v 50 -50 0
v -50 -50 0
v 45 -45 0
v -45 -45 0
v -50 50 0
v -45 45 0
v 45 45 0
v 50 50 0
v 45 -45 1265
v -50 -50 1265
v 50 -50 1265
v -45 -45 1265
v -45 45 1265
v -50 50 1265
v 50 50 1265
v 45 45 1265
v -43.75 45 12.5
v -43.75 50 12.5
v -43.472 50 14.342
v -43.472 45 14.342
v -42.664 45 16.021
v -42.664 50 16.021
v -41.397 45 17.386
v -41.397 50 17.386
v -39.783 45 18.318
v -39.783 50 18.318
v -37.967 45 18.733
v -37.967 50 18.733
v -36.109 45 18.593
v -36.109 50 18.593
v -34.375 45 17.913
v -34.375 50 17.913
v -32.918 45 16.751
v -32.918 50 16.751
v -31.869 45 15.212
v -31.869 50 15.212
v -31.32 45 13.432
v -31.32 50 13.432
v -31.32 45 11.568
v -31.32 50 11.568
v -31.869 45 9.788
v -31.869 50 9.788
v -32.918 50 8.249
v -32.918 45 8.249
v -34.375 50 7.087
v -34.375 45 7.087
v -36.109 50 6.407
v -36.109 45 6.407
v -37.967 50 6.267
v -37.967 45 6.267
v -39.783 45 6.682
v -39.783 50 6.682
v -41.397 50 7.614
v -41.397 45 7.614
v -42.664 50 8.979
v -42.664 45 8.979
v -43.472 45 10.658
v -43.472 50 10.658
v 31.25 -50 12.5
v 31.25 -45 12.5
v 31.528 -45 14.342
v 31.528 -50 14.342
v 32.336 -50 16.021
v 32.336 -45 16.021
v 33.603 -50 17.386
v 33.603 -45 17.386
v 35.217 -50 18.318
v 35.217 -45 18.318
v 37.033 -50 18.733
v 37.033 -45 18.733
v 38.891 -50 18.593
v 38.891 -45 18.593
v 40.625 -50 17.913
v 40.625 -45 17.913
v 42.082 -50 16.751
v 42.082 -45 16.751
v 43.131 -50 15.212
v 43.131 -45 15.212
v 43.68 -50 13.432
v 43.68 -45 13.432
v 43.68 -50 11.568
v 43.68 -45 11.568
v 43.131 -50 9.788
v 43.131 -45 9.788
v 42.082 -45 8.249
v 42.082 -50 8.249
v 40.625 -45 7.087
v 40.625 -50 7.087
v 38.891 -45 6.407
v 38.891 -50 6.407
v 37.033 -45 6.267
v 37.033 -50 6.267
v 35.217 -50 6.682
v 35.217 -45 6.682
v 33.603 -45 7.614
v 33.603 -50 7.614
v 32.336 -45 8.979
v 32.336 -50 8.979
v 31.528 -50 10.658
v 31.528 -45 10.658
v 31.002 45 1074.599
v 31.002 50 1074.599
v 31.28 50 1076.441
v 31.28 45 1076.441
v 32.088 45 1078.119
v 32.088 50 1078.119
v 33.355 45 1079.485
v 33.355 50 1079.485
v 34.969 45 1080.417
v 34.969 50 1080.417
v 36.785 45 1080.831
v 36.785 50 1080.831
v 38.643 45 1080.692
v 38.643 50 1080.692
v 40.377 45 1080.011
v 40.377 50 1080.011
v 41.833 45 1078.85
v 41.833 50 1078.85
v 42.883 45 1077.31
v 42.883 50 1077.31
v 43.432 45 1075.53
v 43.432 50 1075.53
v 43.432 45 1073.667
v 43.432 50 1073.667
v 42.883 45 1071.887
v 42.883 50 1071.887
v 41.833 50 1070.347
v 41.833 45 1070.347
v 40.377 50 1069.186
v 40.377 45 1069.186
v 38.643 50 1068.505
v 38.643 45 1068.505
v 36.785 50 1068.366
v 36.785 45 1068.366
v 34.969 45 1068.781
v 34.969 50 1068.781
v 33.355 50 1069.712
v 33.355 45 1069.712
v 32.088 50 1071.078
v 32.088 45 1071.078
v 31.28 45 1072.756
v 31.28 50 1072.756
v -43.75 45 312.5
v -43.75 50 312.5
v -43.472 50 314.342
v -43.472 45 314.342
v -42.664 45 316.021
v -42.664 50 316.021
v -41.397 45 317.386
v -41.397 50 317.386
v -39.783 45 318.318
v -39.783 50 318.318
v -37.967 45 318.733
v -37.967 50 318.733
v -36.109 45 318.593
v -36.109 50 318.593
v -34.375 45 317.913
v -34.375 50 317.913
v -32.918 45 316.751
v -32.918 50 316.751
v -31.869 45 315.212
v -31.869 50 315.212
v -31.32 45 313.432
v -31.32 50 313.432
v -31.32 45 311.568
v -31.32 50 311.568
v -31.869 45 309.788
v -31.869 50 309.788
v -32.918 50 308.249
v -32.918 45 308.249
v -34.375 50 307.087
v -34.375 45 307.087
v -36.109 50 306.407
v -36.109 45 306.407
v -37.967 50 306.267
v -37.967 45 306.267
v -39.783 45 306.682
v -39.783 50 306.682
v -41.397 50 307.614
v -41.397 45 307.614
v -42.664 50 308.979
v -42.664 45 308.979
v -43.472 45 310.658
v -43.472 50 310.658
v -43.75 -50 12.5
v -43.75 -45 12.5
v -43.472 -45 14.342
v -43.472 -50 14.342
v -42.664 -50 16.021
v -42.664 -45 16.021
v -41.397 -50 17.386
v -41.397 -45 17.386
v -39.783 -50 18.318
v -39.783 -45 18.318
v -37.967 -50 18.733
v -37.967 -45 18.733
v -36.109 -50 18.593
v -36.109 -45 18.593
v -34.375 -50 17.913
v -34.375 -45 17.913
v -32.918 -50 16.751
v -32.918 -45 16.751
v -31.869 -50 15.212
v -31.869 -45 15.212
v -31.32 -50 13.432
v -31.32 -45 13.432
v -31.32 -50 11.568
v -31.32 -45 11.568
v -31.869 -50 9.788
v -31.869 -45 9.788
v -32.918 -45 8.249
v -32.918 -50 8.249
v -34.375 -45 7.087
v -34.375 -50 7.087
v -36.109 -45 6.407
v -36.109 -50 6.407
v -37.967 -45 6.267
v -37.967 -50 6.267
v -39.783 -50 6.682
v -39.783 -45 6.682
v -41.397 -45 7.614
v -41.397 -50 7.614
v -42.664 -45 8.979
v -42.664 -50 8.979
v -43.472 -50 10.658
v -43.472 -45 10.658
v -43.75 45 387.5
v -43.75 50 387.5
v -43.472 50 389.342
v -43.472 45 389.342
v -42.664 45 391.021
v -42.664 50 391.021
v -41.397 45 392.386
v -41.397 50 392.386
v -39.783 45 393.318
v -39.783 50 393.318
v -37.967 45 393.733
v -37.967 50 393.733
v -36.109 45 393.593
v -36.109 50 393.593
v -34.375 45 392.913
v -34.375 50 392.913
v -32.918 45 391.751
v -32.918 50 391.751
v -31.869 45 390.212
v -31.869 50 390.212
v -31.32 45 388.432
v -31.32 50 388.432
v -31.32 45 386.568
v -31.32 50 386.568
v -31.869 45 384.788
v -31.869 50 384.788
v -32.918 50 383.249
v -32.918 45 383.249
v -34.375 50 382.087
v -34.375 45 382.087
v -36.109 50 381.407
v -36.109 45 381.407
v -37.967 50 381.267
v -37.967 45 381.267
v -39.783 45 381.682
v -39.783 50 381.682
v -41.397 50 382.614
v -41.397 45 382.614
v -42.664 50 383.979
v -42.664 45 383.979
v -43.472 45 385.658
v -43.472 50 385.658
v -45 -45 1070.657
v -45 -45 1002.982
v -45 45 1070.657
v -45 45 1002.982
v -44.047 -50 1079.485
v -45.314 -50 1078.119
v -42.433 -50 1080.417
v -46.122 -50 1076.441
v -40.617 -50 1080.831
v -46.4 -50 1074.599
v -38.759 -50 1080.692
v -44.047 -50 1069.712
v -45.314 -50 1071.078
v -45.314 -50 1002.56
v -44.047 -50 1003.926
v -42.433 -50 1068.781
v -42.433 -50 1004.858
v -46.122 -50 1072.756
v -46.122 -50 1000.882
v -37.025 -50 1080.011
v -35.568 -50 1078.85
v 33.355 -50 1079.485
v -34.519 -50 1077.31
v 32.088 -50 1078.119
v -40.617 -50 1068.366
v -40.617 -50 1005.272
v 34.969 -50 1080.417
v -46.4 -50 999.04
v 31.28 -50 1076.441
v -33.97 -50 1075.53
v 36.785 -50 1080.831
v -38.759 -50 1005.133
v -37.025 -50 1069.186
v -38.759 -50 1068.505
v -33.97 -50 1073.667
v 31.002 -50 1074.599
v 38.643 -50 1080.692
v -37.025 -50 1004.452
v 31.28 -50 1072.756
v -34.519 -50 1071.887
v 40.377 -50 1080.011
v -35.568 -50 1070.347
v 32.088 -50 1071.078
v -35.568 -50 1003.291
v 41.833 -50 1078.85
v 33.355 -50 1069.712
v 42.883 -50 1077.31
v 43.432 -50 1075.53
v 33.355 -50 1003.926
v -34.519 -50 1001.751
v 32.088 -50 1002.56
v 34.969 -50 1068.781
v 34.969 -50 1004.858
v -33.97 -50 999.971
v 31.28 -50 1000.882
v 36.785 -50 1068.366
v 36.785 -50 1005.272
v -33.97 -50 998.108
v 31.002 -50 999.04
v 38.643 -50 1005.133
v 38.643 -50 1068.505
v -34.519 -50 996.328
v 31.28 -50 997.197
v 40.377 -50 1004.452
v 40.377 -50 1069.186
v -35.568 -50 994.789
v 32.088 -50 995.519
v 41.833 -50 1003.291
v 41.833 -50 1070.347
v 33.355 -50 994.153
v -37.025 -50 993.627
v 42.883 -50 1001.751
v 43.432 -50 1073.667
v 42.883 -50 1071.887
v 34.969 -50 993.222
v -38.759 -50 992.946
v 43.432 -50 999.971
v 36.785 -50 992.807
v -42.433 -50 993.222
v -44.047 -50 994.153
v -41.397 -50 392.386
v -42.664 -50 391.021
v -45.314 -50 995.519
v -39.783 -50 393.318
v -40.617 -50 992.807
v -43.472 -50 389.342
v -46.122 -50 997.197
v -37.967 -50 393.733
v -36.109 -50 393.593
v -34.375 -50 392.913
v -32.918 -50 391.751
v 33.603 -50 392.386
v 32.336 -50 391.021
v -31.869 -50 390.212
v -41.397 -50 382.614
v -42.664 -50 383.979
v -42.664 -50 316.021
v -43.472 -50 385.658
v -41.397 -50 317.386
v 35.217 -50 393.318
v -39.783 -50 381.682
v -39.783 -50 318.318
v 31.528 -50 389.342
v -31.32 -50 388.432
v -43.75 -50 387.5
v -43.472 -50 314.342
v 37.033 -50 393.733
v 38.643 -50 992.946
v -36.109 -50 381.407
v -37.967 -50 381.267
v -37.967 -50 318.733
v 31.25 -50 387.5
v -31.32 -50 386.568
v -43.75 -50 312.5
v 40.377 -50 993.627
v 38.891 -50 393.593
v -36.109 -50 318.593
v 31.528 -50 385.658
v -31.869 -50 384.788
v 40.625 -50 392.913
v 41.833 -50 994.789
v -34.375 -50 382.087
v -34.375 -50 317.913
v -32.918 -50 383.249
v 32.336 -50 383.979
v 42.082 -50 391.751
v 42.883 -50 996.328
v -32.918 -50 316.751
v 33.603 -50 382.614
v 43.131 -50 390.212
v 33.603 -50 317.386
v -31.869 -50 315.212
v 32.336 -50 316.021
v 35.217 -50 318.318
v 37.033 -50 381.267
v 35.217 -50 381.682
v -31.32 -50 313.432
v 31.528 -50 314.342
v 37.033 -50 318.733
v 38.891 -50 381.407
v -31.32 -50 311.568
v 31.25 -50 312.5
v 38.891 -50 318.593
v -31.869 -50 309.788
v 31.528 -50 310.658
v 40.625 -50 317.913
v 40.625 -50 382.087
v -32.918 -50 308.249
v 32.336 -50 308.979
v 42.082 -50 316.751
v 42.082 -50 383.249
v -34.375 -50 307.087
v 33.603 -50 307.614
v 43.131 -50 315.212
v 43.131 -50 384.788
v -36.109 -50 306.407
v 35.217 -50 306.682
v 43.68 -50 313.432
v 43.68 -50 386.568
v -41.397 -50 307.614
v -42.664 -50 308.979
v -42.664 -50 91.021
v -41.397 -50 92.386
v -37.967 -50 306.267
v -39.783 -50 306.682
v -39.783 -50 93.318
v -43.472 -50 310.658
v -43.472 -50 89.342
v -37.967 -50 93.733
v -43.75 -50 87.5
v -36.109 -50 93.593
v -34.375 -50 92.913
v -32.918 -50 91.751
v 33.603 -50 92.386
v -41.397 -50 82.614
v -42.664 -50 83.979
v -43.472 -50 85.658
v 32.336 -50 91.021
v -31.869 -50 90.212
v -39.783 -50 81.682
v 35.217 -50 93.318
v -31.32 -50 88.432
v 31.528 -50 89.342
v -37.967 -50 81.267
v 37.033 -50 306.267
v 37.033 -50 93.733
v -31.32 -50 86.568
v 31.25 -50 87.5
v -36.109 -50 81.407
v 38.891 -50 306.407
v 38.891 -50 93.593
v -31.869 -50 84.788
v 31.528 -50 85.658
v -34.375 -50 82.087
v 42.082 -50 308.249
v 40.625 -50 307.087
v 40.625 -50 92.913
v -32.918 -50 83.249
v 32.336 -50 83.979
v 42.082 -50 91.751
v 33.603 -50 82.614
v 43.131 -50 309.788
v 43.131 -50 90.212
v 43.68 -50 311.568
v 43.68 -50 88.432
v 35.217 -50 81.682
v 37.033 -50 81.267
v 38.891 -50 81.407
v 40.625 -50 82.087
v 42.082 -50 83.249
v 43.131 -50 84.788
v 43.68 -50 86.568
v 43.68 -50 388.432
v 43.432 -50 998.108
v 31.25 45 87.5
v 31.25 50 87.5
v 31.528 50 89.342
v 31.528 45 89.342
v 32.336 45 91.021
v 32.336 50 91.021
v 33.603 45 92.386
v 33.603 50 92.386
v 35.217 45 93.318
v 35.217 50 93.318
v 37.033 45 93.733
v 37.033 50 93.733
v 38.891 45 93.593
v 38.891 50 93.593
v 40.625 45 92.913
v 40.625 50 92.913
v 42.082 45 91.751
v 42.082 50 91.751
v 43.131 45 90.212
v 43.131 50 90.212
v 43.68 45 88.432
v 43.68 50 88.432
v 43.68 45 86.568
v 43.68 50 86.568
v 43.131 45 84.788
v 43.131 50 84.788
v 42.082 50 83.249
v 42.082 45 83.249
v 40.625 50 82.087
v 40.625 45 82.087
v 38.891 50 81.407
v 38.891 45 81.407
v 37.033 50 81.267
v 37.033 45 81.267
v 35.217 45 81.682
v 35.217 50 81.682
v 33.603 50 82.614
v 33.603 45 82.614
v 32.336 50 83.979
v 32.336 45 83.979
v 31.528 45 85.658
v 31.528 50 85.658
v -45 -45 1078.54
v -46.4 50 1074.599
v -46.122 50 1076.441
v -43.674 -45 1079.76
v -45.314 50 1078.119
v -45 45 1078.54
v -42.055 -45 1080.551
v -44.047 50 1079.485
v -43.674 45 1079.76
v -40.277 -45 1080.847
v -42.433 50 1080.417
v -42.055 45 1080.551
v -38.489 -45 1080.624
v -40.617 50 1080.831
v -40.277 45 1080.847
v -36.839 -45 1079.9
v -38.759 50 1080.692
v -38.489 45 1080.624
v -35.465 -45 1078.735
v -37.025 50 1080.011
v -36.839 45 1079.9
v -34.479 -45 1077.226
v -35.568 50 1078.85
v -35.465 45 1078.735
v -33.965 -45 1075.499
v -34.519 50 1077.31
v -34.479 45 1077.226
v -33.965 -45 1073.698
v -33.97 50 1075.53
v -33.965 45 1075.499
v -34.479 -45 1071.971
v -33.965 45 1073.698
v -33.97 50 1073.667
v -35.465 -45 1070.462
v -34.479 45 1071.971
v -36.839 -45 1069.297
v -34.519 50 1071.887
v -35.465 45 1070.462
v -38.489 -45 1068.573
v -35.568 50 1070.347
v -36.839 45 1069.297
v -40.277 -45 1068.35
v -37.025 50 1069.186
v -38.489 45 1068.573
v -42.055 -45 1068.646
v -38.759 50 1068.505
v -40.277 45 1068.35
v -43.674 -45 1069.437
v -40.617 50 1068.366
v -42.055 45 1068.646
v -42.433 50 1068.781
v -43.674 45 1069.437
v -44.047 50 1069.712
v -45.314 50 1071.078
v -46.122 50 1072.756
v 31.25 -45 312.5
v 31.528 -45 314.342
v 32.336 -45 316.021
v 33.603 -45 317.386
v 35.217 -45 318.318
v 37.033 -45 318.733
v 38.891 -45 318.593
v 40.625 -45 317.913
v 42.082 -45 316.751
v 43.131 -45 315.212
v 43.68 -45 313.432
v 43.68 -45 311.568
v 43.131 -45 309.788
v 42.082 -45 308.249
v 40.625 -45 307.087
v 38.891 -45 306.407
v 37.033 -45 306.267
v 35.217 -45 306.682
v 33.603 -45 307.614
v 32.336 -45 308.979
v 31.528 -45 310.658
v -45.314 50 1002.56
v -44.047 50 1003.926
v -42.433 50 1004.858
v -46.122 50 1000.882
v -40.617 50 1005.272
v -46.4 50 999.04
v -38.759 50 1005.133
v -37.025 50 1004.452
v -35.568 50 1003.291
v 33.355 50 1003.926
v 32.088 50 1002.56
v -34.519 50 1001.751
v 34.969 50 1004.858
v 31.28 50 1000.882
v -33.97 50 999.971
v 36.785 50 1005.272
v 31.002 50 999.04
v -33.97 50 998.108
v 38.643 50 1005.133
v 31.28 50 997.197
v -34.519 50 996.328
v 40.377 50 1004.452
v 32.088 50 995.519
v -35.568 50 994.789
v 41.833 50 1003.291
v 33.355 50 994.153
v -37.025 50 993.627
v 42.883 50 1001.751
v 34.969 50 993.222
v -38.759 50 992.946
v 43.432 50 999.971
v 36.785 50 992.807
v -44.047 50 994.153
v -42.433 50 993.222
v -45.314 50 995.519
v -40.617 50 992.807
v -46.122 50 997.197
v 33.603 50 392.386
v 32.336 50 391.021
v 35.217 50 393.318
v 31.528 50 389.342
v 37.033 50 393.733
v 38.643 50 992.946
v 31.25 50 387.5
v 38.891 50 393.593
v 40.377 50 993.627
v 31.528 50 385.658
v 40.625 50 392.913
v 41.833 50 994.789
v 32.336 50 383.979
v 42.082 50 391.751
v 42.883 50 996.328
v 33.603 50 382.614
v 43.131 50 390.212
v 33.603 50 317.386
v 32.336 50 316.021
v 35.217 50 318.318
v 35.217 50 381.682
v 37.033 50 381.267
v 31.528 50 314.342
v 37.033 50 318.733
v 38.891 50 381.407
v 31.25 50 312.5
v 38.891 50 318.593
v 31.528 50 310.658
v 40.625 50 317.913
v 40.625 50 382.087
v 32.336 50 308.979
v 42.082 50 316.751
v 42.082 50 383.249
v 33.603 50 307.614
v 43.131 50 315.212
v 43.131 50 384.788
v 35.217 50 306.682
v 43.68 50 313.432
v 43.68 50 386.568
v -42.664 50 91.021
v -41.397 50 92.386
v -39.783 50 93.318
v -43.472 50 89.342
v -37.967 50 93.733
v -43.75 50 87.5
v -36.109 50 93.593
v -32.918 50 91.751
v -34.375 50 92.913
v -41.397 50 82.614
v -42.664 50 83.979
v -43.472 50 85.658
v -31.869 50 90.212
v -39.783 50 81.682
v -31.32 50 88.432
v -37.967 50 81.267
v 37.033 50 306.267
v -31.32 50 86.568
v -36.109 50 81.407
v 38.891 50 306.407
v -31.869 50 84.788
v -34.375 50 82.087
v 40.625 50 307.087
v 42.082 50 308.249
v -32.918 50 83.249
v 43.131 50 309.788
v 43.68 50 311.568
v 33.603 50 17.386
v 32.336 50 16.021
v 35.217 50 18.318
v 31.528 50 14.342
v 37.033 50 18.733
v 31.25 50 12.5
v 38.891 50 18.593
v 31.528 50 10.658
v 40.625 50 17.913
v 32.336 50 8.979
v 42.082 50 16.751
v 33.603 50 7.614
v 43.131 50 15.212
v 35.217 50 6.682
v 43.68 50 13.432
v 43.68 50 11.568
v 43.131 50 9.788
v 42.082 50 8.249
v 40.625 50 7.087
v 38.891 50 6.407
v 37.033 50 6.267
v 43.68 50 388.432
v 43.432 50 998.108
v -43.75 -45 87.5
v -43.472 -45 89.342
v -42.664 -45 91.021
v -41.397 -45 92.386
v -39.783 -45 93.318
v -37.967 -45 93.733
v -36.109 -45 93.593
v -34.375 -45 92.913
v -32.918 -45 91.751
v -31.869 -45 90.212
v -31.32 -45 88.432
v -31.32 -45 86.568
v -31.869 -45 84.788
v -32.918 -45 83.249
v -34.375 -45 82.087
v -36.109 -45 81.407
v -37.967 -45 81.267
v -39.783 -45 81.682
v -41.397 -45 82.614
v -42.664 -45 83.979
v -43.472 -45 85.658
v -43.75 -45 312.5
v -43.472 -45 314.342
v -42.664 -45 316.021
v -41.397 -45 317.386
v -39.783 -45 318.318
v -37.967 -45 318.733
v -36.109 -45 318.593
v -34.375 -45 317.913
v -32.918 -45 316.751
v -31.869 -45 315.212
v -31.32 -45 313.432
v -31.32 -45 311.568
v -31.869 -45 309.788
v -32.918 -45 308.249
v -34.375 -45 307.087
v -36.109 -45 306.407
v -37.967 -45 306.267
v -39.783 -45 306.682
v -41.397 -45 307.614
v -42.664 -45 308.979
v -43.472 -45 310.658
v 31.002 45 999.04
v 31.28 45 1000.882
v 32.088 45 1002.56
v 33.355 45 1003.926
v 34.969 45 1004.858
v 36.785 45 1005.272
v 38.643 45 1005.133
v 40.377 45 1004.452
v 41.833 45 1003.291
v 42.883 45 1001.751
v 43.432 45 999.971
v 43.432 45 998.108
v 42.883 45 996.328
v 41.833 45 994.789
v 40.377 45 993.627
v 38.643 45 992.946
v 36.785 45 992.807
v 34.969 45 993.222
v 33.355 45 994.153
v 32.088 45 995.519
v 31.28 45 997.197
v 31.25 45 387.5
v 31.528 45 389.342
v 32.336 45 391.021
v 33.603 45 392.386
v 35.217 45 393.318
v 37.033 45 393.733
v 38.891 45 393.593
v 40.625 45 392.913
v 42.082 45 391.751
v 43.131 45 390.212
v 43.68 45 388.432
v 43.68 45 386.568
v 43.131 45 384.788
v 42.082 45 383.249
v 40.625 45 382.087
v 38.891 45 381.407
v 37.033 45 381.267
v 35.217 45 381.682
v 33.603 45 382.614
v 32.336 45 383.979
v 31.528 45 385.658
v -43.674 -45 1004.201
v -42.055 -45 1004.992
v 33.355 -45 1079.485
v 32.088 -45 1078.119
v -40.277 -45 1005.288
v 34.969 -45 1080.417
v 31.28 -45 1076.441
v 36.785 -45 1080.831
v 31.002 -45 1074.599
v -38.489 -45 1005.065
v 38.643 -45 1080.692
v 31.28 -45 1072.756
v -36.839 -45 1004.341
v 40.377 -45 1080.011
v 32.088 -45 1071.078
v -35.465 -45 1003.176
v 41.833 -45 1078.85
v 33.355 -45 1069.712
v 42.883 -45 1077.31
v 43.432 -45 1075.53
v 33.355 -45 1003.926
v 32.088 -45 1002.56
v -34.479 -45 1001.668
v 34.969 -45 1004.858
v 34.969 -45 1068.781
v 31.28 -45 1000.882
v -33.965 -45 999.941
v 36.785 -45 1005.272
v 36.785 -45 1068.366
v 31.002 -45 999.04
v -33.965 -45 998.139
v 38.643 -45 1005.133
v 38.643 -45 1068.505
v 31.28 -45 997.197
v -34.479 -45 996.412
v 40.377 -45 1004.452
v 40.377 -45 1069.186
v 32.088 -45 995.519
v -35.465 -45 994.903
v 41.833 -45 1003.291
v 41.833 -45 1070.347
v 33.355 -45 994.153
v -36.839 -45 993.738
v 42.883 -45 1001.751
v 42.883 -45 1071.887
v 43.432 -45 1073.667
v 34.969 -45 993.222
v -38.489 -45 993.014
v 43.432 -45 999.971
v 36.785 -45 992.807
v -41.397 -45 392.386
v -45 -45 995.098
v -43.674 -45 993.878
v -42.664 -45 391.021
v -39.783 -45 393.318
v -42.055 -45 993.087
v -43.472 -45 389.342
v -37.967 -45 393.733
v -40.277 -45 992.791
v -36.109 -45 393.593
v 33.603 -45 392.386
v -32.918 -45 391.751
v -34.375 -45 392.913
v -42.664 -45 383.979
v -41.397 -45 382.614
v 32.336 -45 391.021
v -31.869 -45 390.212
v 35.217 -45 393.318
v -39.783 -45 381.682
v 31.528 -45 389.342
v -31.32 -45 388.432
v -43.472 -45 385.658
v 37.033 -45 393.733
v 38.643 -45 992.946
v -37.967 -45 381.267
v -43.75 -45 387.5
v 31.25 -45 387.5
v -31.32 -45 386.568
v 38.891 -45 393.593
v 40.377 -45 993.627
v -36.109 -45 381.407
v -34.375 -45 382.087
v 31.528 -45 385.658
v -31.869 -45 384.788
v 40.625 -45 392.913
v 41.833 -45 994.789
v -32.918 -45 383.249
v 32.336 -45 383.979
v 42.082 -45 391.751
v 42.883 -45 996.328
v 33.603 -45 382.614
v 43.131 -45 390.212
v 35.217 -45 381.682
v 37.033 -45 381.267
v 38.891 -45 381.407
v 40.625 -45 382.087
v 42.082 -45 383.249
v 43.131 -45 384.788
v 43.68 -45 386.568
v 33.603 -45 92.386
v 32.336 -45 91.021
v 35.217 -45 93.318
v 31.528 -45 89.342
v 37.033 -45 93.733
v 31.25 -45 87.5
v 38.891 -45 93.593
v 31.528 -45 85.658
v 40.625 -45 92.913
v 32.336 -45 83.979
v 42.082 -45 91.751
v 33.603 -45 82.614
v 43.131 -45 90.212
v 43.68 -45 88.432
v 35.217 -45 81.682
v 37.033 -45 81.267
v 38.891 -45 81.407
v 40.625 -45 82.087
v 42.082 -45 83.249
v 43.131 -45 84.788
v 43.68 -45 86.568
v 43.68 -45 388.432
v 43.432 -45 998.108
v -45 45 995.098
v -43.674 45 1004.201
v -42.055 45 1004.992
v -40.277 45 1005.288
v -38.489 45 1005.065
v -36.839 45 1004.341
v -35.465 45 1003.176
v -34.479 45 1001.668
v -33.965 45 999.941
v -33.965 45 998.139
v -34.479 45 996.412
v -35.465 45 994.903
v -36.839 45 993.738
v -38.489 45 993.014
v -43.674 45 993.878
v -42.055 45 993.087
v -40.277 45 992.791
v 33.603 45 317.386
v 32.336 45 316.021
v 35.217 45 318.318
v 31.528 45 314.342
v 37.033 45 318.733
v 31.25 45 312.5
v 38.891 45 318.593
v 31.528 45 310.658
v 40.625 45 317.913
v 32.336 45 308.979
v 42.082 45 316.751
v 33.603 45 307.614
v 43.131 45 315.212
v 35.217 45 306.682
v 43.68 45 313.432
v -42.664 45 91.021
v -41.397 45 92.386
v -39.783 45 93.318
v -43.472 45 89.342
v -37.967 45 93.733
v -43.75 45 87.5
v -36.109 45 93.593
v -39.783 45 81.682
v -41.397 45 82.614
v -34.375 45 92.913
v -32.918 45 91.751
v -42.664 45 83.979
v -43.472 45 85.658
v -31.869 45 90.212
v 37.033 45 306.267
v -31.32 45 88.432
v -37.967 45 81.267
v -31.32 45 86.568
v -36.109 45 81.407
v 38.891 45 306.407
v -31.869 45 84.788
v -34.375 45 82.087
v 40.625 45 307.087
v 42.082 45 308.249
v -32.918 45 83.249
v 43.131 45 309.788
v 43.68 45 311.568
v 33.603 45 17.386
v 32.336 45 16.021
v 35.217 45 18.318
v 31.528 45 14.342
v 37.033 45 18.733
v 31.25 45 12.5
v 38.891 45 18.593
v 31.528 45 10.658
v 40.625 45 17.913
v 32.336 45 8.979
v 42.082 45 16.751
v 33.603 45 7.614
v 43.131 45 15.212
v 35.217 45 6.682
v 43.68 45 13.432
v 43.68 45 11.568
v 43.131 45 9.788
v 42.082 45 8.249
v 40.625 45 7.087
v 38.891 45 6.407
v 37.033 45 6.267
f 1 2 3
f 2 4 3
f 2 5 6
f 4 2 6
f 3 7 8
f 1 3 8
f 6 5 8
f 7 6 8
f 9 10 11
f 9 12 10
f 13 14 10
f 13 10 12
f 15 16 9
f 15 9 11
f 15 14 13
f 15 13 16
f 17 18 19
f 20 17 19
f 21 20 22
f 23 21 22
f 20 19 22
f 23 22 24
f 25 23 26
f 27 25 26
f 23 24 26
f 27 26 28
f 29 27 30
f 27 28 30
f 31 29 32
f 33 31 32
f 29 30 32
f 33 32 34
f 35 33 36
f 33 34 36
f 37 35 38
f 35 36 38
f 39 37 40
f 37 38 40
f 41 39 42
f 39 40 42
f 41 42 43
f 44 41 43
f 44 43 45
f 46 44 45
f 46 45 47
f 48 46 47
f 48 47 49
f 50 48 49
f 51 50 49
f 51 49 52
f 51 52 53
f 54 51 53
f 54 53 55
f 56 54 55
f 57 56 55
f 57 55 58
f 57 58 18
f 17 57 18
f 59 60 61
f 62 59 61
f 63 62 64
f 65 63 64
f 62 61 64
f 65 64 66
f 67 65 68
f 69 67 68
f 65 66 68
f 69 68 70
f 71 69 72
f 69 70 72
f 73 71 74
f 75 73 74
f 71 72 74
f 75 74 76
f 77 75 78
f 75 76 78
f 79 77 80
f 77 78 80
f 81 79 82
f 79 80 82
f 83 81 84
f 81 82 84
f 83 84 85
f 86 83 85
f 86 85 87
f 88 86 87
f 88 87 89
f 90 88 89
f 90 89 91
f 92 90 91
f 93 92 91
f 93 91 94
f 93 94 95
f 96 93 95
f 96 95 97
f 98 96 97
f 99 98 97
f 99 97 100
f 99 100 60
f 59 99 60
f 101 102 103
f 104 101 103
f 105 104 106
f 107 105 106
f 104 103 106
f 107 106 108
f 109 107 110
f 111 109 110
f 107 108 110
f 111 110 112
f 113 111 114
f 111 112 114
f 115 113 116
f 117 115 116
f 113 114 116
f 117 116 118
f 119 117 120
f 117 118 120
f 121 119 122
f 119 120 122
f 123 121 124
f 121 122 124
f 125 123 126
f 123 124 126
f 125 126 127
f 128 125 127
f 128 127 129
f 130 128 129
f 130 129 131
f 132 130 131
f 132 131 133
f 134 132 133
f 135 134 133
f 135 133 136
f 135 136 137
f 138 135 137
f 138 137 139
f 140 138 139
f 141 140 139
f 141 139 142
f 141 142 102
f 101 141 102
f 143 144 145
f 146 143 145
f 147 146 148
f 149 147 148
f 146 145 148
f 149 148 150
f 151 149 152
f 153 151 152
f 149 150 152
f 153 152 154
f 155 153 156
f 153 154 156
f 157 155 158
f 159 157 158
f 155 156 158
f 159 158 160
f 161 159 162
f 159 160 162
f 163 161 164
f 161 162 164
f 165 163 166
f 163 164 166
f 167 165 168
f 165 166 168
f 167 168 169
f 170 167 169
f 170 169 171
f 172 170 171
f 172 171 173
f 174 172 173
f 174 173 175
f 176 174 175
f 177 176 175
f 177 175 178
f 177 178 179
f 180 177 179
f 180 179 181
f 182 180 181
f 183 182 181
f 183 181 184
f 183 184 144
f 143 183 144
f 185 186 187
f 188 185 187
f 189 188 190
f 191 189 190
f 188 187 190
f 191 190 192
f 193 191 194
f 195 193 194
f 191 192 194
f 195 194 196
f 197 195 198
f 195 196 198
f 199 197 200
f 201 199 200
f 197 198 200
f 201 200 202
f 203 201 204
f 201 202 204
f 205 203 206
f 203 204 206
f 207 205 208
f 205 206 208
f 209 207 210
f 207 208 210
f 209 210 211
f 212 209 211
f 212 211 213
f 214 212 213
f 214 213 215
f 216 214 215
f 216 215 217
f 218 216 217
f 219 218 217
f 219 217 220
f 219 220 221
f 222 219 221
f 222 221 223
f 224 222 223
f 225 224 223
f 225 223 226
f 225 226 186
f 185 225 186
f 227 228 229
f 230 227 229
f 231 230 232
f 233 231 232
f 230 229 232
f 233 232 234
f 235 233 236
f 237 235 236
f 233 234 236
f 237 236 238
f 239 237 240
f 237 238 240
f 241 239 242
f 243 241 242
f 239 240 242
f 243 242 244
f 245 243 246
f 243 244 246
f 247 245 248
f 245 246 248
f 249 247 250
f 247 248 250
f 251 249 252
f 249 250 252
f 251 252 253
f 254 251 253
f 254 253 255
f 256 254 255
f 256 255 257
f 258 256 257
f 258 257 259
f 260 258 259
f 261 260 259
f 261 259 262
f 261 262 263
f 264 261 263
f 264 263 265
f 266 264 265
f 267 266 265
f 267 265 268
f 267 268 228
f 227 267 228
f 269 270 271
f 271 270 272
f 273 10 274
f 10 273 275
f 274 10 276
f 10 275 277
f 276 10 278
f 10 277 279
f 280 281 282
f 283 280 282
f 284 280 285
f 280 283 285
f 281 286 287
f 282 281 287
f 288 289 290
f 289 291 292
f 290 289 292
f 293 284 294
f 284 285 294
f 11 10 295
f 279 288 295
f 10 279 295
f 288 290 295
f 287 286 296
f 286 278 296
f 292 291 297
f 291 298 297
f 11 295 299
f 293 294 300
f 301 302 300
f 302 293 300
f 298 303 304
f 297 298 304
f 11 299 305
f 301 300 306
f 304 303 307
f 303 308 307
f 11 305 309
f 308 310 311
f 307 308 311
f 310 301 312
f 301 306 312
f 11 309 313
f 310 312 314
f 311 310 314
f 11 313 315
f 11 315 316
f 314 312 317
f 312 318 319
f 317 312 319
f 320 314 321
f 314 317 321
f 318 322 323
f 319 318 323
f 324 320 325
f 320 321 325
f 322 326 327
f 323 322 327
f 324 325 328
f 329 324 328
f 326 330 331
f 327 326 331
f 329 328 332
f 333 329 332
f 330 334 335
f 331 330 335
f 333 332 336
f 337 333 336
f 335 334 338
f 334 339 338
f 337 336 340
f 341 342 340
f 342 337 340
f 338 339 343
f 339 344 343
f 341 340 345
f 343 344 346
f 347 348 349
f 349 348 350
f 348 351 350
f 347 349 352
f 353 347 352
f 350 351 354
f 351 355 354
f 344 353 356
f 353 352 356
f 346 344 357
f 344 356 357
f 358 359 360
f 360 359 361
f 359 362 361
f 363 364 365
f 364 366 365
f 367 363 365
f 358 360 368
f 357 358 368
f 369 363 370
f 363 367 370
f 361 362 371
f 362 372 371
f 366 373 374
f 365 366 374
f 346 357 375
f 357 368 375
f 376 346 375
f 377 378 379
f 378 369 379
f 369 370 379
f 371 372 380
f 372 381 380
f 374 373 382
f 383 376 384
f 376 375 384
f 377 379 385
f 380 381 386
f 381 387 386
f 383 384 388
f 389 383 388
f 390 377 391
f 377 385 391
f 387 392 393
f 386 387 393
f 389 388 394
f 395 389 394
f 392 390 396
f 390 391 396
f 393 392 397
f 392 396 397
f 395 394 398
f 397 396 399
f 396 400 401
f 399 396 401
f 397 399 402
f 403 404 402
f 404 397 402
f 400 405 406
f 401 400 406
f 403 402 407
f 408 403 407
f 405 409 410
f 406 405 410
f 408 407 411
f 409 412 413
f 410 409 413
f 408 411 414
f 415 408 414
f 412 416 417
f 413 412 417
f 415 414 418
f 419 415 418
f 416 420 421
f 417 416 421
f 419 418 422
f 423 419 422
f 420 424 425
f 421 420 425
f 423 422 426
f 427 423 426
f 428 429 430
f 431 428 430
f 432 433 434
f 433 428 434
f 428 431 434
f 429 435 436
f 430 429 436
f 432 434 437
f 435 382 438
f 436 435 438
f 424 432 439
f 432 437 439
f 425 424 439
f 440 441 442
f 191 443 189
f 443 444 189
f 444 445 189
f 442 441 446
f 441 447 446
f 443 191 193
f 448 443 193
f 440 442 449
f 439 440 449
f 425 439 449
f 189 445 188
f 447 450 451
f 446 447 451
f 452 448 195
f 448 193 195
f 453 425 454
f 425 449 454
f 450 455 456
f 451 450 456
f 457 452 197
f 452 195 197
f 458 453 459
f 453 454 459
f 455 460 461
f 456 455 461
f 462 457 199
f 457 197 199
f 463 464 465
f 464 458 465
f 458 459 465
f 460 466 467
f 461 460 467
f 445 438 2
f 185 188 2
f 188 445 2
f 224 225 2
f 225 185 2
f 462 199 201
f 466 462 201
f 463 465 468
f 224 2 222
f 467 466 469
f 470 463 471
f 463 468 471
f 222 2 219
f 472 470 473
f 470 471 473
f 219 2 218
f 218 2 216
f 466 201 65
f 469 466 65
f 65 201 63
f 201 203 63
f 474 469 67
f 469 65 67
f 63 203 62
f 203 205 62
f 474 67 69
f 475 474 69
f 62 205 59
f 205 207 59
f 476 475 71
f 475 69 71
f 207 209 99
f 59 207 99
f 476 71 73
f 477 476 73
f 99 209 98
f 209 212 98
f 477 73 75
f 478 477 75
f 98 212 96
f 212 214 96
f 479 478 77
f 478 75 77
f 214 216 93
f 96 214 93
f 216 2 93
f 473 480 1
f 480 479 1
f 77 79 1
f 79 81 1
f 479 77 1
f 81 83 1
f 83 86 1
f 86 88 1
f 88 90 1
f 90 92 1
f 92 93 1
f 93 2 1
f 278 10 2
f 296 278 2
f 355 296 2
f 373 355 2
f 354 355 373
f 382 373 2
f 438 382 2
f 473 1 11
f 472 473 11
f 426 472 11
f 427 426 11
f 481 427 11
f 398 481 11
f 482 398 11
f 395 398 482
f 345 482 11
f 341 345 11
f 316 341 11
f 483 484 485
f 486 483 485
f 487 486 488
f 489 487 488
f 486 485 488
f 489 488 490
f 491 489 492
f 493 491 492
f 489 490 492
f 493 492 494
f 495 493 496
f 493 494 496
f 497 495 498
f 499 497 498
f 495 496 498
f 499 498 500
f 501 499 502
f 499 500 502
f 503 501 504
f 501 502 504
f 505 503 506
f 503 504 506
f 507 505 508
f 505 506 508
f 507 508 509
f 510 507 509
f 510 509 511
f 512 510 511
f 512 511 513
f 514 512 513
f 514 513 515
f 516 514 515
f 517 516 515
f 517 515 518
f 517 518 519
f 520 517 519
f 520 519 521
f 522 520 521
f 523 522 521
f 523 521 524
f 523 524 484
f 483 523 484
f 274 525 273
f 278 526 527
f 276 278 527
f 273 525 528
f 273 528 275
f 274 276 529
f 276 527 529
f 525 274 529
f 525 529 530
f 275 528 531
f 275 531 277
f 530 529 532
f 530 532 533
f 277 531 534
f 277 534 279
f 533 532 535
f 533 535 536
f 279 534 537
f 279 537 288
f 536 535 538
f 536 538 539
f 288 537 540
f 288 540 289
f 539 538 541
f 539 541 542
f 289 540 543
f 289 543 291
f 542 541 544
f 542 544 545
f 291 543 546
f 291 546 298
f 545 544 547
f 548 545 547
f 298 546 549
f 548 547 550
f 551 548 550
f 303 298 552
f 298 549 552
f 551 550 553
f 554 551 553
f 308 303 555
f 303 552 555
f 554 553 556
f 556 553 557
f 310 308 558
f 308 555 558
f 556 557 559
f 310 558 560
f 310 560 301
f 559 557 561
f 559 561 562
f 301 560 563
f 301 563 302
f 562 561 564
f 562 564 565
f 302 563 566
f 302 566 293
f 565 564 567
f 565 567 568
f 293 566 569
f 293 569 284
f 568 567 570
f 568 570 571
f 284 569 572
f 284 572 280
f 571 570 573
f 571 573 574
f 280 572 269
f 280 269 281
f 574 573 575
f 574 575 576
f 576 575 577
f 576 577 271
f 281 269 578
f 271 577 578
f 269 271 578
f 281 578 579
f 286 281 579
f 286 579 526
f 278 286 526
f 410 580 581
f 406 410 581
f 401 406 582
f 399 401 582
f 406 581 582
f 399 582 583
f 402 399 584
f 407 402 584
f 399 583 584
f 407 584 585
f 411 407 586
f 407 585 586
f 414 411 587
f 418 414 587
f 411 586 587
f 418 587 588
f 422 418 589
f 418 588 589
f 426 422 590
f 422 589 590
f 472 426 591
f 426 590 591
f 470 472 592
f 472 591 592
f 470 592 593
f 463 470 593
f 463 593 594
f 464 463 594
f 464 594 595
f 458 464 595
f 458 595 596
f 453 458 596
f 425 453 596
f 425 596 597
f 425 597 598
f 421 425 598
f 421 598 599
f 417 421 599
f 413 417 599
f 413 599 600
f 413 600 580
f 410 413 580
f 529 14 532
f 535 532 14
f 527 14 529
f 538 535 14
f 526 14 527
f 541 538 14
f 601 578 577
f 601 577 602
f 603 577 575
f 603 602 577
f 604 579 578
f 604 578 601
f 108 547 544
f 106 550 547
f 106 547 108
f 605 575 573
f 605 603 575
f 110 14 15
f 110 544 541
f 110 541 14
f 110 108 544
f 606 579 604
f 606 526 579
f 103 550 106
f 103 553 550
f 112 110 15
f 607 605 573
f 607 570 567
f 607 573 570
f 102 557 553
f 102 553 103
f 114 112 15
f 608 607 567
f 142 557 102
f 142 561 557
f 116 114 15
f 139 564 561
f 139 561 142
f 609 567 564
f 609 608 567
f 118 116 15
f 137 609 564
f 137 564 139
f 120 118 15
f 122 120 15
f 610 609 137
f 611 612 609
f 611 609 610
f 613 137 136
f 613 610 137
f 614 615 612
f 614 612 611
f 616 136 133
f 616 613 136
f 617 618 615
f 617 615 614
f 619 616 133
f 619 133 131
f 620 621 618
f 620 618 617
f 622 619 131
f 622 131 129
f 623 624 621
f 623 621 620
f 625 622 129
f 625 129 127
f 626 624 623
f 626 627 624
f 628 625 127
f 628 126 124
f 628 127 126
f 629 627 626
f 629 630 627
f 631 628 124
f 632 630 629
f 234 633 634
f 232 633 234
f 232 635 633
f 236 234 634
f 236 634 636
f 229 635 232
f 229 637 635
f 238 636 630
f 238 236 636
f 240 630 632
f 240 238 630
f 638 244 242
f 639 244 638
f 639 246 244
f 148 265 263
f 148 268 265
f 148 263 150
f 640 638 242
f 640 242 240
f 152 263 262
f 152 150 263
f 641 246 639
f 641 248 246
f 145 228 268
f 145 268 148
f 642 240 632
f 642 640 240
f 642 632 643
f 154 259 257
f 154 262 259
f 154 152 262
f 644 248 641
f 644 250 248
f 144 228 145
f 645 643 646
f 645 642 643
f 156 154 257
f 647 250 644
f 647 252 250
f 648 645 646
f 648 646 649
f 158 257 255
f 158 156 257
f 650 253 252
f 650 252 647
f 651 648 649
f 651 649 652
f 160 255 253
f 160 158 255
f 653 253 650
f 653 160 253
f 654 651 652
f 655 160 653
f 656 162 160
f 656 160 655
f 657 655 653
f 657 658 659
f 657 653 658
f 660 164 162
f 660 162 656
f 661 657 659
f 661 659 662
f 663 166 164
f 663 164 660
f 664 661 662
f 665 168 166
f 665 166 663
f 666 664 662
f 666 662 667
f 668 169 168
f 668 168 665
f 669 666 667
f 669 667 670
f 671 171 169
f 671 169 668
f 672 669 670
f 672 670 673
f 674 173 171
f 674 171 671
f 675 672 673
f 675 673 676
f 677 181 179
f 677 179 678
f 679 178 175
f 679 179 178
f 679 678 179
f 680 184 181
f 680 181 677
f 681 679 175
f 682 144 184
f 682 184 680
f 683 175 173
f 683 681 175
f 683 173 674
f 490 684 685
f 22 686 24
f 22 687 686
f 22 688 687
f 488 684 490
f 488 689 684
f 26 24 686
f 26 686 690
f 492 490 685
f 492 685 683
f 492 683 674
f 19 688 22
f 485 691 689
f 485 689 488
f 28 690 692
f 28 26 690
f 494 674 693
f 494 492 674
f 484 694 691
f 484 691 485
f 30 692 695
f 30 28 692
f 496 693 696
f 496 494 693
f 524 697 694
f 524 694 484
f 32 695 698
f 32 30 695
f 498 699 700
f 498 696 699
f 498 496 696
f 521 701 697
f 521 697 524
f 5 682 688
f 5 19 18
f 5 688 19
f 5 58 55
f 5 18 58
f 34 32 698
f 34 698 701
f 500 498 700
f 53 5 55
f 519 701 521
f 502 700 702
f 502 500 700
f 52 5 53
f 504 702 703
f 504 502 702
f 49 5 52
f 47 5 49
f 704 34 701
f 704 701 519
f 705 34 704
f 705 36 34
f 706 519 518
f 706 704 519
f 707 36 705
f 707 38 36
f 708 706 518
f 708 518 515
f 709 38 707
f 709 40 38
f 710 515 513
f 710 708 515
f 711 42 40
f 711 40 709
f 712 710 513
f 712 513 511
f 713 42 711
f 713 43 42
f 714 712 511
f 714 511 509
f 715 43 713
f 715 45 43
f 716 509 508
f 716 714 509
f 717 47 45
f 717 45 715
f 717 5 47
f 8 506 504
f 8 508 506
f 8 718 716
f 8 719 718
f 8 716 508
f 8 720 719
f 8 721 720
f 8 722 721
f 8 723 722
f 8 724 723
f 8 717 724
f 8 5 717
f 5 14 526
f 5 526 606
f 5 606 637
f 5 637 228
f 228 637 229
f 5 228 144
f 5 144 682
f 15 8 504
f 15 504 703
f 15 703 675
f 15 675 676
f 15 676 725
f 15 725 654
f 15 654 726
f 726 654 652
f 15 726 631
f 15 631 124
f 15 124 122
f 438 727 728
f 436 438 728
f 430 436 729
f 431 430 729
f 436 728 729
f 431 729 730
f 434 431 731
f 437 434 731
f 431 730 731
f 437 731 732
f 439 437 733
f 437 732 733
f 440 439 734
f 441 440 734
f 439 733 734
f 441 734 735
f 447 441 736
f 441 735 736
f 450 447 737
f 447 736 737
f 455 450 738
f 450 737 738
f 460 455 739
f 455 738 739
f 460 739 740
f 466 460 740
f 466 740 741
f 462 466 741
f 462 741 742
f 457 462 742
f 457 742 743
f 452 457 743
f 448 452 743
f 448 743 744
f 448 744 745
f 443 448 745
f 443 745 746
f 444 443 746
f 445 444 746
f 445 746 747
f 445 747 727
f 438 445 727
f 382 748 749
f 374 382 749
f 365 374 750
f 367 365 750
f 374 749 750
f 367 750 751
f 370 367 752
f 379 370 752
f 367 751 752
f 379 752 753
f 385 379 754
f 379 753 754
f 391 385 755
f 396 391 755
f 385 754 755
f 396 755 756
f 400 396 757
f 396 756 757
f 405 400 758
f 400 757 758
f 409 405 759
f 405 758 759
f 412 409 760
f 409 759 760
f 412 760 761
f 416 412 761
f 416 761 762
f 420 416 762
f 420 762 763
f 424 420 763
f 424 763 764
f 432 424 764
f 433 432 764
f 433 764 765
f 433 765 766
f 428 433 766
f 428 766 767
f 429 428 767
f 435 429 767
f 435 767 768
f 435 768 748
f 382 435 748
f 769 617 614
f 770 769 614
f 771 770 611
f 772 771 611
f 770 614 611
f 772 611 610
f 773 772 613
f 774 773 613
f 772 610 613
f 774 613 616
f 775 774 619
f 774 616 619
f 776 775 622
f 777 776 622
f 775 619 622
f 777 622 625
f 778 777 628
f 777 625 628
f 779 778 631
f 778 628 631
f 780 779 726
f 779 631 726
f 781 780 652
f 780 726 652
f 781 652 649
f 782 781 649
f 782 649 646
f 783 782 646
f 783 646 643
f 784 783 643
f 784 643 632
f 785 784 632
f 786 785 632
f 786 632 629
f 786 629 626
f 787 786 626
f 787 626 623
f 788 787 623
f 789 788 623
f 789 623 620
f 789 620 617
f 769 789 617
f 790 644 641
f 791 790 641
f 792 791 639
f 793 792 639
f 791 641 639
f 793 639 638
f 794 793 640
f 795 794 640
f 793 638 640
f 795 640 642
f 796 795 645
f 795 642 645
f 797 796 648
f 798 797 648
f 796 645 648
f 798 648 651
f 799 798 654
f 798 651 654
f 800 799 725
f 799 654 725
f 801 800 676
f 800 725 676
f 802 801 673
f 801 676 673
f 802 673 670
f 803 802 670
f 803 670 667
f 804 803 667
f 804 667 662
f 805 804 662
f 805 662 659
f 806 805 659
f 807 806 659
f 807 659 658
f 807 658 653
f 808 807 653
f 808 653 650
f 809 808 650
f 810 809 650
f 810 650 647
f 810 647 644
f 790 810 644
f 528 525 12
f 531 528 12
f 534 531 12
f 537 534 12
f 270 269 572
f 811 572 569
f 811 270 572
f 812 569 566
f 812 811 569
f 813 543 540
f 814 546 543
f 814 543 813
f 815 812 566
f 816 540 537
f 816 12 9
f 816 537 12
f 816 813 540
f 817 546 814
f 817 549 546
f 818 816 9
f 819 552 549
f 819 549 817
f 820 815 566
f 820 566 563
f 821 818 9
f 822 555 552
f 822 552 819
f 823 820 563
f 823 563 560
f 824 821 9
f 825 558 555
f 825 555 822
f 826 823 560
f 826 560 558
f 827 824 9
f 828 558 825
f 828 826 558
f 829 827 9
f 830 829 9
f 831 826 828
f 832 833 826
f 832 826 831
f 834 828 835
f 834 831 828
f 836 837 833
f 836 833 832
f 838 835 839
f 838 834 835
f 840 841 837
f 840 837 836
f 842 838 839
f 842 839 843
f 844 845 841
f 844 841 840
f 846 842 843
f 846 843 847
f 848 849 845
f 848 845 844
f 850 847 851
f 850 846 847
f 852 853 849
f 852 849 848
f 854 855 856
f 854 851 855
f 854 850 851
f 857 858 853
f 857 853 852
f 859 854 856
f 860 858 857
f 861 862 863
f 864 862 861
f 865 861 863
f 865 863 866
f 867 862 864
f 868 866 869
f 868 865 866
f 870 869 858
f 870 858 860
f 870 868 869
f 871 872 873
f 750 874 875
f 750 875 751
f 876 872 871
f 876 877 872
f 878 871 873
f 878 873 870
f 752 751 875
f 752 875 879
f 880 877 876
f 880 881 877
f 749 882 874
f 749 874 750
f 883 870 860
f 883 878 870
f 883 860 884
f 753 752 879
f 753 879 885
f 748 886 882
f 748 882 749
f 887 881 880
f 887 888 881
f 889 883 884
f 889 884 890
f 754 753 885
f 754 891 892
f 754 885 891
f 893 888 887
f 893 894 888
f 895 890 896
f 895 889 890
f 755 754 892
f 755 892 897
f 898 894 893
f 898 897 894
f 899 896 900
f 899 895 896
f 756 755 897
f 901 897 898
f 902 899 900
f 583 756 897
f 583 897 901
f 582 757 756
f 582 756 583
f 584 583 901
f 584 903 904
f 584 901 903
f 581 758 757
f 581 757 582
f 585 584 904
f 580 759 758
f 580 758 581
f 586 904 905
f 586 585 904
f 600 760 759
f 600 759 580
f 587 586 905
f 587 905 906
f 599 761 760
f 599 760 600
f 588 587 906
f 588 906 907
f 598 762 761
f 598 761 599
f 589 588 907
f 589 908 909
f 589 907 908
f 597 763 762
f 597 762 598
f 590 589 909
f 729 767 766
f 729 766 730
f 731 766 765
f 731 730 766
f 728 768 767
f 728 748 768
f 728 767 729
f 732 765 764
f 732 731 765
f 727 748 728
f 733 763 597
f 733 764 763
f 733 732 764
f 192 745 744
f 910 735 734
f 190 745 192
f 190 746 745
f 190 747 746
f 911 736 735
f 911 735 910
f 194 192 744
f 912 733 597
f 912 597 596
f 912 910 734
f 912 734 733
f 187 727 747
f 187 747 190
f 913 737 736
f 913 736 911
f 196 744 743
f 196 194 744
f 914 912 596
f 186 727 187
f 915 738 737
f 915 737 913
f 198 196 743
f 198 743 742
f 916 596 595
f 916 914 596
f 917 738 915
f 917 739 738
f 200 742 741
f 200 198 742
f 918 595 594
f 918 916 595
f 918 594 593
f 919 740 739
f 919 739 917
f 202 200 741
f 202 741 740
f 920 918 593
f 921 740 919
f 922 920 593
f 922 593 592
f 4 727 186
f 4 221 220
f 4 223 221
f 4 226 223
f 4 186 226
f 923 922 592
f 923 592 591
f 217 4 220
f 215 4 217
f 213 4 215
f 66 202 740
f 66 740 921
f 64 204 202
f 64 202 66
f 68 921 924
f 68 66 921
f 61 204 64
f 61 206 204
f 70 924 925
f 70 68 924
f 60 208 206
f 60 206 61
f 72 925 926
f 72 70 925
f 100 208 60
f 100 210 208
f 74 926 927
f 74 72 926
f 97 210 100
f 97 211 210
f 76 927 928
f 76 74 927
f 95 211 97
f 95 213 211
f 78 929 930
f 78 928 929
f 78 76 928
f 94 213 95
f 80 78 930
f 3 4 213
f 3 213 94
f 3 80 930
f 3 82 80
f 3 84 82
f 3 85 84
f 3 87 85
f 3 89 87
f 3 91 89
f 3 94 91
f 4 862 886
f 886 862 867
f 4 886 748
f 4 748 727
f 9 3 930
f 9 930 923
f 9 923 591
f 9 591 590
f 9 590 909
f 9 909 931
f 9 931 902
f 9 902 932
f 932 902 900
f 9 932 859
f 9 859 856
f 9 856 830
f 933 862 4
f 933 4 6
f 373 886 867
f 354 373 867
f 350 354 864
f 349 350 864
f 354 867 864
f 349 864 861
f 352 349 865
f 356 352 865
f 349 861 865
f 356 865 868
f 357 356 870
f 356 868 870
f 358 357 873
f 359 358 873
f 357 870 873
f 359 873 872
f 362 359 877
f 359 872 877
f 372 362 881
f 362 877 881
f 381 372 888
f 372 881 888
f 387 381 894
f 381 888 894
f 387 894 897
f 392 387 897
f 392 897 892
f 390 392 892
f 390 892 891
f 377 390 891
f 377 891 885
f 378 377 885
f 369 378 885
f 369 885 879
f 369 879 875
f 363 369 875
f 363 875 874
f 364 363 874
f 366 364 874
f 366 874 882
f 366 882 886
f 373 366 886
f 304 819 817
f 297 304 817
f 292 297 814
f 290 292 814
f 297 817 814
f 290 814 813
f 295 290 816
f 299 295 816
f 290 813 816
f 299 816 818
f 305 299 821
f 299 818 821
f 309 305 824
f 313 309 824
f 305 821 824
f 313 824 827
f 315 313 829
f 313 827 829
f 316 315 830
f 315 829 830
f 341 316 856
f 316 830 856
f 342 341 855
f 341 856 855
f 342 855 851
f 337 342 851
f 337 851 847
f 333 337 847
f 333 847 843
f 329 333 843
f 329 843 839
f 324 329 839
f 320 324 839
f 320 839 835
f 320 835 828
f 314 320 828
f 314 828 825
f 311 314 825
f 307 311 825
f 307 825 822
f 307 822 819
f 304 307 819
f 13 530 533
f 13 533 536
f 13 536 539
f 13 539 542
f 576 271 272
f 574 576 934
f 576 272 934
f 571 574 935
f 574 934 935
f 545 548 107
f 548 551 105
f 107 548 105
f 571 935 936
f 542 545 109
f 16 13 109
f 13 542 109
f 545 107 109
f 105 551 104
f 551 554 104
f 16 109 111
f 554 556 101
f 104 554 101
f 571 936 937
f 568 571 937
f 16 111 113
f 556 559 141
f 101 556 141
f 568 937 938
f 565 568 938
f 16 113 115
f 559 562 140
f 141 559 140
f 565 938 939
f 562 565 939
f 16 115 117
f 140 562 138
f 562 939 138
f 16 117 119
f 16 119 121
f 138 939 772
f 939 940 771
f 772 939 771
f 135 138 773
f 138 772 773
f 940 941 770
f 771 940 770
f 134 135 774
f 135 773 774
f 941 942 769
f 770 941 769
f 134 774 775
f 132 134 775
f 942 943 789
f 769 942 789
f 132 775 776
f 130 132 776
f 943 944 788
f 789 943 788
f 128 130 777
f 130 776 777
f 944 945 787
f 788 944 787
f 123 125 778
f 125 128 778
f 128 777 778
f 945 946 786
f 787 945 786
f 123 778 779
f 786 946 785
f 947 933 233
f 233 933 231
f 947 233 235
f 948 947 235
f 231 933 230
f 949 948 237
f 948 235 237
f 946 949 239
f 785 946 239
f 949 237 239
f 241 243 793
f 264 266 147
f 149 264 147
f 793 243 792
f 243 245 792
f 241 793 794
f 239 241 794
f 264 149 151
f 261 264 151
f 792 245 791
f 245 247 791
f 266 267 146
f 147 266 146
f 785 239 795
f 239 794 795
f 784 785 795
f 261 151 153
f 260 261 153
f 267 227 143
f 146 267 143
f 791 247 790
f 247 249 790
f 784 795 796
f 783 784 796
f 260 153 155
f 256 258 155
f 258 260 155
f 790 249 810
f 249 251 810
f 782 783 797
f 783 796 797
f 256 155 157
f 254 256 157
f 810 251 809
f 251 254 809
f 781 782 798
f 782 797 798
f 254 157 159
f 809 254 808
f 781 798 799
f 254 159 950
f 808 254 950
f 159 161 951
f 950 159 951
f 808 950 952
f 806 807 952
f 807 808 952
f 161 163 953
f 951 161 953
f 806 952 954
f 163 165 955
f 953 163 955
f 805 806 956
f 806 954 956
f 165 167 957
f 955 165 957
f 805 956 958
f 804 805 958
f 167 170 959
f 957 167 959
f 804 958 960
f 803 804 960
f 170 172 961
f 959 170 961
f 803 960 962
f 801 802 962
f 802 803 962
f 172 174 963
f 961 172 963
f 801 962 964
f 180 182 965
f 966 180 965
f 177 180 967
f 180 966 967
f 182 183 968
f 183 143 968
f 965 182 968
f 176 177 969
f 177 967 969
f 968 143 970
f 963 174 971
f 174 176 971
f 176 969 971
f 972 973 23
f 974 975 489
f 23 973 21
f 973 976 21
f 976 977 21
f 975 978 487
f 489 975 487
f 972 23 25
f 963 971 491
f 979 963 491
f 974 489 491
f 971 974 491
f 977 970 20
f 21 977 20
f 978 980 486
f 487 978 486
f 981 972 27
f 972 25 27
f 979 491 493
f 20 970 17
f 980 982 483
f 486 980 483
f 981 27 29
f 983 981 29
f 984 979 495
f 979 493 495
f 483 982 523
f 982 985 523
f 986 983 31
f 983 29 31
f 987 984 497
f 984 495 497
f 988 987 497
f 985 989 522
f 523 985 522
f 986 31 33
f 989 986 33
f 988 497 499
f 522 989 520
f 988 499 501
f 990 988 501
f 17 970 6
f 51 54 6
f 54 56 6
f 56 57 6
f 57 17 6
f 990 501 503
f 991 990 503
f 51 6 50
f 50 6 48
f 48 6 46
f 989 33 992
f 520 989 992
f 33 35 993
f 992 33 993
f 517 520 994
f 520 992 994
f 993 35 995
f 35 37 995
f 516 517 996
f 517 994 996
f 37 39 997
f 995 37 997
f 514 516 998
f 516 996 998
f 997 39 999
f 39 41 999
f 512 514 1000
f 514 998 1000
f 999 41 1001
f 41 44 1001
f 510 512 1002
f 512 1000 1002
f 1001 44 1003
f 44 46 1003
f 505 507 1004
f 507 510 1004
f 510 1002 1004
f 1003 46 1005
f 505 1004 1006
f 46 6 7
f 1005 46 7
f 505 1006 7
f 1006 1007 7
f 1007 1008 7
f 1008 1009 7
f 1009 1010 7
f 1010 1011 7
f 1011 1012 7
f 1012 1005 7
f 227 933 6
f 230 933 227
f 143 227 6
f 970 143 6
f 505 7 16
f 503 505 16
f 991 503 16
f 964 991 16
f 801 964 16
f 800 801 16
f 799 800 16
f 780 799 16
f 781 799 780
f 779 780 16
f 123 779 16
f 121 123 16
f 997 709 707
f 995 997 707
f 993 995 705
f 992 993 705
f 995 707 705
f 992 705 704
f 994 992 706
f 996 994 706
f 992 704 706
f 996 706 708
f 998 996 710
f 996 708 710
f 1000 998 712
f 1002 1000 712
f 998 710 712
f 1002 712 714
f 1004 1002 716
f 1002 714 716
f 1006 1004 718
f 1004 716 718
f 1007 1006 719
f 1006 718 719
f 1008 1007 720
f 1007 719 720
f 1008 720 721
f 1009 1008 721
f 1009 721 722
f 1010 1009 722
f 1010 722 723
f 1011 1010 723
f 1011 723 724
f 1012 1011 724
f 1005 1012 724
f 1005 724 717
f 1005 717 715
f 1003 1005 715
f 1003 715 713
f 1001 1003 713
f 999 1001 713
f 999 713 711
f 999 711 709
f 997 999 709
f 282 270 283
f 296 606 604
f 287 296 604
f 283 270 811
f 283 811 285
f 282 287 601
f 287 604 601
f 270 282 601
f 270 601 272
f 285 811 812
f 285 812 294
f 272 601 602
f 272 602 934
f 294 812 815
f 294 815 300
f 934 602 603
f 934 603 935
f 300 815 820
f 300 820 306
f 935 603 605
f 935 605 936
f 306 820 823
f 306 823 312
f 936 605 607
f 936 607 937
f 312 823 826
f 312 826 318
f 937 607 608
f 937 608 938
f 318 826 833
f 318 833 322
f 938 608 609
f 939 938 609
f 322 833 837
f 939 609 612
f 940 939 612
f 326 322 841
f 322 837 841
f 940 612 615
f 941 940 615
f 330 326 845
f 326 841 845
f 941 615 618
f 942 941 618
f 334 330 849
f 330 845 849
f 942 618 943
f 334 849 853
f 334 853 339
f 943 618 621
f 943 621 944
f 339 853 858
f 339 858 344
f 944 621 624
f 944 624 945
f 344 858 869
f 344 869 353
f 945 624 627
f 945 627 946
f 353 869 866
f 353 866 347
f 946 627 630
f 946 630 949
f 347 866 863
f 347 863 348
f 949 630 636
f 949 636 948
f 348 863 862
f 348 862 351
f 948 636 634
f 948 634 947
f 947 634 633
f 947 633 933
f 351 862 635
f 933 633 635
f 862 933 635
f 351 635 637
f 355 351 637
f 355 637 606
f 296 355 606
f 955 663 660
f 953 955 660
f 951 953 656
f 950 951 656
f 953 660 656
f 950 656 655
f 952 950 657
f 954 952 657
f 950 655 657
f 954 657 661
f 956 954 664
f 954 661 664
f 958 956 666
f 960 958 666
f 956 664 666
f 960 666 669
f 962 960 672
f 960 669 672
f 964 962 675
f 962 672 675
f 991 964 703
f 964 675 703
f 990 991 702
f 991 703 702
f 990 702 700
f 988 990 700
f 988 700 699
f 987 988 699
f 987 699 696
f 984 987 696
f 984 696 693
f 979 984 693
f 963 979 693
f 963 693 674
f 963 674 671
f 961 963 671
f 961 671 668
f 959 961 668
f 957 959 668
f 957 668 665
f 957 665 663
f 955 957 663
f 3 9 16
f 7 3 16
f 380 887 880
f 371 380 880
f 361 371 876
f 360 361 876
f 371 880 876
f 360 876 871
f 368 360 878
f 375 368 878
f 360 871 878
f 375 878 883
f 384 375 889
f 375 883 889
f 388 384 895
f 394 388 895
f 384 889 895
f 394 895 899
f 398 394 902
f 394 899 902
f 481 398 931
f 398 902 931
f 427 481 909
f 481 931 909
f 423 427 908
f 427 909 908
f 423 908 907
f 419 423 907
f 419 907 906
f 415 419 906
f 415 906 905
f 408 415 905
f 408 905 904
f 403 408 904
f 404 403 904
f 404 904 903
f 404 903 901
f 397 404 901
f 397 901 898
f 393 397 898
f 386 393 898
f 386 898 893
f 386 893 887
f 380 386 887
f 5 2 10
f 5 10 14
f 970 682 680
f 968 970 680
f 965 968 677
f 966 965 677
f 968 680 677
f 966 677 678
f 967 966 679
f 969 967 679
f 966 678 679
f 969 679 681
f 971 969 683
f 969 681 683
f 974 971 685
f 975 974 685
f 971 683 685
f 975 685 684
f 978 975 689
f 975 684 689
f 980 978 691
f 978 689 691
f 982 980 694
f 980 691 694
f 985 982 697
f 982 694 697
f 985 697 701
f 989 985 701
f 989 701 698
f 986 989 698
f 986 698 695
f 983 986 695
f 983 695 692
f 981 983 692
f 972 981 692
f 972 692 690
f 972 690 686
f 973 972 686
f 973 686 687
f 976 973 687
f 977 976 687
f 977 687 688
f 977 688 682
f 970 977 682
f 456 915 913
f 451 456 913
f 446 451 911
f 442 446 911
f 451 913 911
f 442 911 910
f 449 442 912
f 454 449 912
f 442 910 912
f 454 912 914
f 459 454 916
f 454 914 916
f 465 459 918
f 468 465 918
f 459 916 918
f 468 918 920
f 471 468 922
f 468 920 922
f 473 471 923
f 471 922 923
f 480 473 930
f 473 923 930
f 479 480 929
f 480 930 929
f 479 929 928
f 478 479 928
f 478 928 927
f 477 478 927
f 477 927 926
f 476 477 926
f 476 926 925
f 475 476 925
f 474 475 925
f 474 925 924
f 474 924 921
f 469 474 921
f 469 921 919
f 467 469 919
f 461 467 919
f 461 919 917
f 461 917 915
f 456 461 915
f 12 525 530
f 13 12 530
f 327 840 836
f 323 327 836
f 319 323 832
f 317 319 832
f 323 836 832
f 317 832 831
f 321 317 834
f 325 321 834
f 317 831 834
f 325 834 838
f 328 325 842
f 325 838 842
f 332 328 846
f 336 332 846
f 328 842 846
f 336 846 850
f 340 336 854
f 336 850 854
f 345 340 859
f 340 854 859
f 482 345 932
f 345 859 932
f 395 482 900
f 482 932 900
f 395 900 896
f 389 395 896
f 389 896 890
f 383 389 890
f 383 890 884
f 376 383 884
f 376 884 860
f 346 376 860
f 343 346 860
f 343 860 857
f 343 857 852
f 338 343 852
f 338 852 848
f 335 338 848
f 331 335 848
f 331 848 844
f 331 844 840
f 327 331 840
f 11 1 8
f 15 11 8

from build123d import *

# Parameters (mm, degrees)
F0_W     = 100
F0_H     = 100
F0_W_2   = 90
F0_H_2   = 90
F1_DEPTH = 1265
F3_D     = 12.5
F5_D     = 12.5


with BuildPart() as f1:
    # F0 (on Top) → F1 (new body)
    with BuildSketch(Plane.XY):
        Rectangle(F0_W, F0_H)
        Rectangle(F0_W_2, F0_H_2, mode=Mode.SUBTRACT)
    extrude(amount=F1_DEPTH)

    # F3 (through all)
    with Locations(Plane.XZ.offset(50)):
        with Locations((-37.5, 387.5), (37.5, 387.5), (37.5, 312.5), (-37.5, 312.5), (-37.5, 87.5), (-37.5, 12.5), (37.5, 87.5), (37.5, 12.5)):
            Hole(F3_D / 2)

    # F5 (through all)
    with Locations(Plane.XZ.offset(50)):
        with Locations((-40.149868, 999.03965), (37.251893, 999.03965), (-40.149868, 1074.598551), (37.251893, 1074.598551)):
            Hole(F5_D / 2)


solid = f1.part
